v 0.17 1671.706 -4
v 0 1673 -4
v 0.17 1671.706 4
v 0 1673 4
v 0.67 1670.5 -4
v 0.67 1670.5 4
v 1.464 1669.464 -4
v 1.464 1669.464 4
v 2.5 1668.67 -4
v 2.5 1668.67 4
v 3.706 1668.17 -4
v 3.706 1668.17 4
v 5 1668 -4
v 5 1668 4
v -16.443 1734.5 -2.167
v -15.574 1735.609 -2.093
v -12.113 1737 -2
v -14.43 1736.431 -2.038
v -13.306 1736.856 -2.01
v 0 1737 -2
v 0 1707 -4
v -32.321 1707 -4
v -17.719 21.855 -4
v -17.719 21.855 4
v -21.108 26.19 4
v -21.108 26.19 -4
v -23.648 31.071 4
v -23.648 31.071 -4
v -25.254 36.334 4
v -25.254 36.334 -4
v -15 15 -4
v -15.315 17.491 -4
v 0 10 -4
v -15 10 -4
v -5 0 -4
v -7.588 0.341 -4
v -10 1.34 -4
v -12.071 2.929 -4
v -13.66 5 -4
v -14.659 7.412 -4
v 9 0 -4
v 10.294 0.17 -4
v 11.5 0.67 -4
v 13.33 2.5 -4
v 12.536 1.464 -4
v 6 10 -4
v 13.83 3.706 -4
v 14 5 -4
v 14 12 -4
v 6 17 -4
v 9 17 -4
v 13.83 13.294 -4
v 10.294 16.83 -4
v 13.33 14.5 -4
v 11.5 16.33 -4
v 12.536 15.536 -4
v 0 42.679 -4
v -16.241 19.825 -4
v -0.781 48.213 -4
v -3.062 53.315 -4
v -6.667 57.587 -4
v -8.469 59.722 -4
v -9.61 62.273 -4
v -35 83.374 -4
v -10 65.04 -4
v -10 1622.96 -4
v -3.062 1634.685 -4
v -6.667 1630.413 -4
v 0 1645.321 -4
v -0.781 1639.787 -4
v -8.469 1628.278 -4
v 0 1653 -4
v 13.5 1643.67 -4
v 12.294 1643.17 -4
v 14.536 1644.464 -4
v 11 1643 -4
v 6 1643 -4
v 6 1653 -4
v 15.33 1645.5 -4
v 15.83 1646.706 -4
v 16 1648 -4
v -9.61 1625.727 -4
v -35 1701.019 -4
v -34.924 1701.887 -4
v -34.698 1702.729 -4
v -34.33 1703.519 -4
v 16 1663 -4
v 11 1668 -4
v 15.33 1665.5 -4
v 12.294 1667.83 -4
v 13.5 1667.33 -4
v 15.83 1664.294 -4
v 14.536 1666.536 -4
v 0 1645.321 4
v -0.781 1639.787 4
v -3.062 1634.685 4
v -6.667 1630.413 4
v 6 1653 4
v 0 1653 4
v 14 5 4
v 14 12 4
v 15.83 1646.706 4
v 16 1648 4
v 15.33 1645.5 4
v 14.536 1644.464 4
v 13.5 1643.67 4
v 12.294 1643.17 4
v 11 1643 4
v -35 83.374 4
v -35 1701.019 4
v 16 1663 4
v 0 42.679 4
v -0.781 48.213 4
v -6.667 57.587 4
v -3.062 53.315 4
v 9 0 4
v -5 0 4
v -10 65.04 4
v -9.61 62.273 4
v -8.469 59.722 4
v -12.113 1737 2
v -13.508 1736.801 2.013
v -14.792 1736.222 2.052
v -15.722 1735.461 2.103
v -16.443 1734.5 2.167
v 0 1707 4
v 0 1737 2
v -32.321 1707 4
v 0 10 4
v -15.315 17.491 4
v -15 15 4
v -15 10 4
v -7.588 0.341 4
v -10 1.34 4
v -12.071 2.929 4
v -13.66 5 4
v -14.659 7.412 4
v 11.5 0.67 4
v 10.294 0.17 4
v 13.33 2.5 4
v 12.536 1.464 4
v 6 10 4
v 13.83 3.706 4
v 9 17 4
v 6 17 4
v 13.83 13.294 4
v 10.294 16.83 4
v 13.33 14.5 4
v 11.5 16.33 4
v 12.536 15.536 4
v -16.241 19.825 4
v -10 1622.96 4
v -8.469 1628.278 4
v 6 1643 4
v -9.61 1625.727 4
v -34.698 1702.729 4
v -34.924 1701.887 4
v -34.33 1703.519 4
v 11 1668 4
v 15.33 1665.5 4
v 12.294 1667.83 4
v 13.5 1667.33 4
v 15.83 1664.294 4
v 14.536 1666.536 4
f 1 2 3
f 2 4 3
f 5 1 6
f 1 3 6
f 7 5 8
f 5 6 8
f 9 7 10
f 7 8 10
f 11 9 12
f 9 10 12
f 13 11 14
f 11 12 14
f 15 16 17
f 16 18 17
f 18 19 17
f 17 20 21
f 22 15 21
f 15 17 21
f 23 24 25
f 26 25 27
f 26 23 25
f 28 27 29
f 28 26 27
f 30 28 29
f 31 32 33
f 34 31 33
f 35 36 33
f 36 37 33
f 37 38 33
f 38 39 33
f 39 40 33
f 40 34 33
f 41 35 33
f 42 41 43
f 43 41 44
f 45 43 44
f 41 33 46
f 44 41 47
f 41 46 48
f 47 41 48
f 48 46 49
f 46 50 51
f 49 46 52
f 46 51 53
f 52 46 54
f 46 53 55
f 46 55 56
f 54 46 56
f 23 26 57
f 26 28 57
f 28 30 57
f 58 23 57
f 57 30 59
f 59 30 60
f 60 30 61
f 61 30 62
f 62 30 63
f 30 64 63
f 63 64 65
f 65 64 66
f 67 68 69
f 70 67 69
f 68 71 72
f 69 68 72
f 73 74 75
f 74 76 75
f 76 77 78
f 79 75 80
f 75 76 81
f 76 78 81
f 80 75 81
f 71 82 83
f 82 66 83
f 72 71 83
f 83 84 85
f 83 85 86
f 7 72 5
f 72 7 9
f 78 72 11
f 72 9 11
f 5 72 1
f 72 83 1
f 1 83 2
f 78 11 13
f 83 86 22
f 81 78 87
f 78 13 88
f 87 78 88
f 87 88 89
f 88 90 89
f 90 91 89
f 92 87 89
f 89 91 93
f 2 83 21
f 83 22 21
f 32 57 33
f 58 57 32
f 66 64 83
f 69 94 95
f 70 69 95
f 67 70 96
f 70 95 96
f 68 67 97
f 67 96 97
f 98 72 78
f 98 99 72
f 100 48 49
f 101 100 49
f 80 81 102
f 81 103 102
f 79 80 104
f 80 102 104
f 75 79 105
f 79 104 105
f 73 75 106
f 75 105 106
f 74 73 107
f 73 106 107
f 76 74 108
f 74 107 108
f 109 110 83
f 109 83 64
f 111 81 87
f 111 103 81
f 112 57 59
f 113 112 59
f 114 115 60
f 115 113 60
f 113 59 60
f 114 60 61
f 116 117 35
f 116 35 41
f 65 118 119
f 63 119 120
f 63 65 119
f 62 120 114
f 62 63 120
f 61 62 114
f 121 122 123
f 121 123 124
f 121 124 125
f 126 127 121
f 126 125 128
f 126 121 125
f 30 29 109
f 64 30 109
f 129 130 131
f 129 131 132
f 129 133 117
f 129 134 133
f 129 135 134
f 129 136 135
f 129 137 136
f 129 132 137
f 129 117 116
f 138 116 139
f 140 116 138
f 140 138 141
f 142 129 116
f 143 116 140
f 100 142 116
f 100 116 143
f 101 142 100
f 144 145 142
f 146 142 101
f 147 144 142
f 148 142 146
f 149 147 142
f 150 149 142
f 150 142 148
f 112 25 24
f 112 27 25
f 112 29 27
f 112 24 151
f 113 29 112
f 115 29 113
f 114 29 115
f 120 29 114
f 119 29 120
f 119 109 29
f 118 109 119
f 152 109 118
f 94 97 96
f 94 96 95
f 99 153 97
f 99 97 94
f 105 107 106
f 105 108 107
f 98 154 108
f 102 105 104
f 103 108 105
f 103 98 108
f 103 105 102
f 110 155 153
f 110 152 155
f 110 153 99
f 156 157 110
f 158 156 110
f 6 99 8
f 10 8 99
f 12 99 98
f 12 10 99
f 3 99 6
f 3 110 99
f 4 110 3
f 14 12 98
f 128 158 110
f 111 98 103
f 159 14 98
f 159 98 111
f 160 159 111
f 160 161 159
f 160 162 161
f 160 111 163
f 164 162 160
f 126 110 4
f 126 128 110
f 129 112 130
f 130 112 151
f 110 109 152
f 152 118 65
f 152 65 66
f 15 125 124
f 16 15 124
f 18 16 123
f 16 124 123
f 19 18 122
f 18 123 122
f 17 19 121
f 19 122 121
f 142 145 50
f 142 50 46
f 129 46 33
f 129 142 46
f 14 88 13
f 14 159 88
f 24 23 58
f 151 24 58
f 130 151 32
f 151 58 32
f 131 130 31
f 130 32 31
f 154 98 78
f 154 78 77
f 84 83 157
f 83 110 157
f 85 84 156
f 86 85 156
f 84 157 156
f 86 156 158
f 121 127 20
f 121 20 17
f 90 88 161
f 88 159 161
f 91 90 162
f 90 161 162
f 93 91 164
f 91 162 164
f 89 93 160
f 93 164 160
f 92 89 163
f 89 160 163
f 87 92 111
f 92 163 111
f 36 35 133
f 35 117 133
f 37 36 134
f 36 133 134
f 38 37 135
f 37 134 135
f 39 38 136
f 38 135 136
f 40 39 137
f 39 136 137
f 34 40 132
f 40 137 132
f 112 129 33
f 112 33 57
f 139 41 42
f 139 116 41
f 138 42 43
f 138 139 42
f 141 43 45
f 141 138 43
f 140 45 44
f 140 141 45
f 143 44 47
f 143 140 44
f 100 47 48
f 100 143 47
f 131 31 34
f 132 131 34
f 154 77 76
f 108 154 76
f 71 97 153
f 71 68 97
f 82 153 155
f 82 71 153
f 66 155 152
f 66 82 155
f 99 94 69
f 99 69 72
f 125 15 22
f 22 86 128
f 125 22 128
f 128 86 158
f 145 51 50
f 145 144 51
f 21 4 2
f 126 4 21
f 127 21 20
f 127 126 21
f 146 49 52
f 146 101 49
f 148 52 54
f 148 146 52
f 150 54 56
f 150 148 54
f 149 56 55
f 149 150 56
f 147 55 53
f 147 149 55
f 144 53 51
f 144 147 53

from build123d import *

# Parameters (mm, degrees)
EXTRUDE_1_DEPTH          = 4
CHAMFER_1_SIZE           = 20
CHAMFER_1_SIZE2          = 34.641016151
FILLET_1_R               = 5
SKETCH_2_W               = 20
SKETCH_2_H               = 1568
CUT_EXTRUDE_1_DEPTH      = 1738.371002406
FILLET_2_R               = 20
FILLET_3_R               = 10
CUT_EXTRUDE_2_DEPTH      = 1738.371002406
CUT_EXTRUDE_2_DEPTH_BACK = 1738.371002406
FILLET_4_R               = 10
CHAMFER_START            = -30
CHAMFER_4_OUTLINE_W      = 63
CHAMFER_4_OUTLINE_H      = 8
CHAMFER_4_DEPTH          = 12.643216867
FILLET_6_R               = 30
CUT_EXTRUDE_3_DEPTH      = 1738.357188375


with BuildPart() as part:
    # Эскиз1 → Бобышка-Вытянуть1 (new, symmetric)
    with BuildSketch(Plane.XY):
        Polygon((0, 1653), (6, 1653), (6, 1643), (16, 1643), (16, 1668), (0, 1668), (0, 1737), (-35, 1737), (-35, 0), (14, 0), (14, 17), (6, 17), (6, 10), (0, 10), align=None)
    extrude(amount=EXTRUDE_1_DEPTH, both=True)

    # Фаска1
    chamfer_1_edges = [part.edges().sort_by_distance(p)[0] for p in [
        (-35, 1737, 0),
    ]]
    chamfer_1_side = [part.faces().sort_by_distance(p)[0] for p in [
        (-17.5, 1737, 0),
    ]]
    chamfer(chamfer_1_edges, length=CHAMFER_1_SIZE, length2=CHAMFER_1_SIZE2, reference=chamfer_1_side[0])

    # Скругление1
    fillet_1_edges = [part.edges().sort_by_distance(p)[0] for p in [
        (0, 1668, 0),
        (16, 1668, 0),
        (16, 1643, 0),
        (14, 17, 0),
        (14, 0, 0),
        (-35, 1702.358983849, 0),
        (-15, 1737, 0),
    ]]
    fillet(fillet_1_edges, radius=FILLET_1_R)

    # Эскиз2 → Вырез-Вытянуть1 (cut, through all)
    with BuildSketch(Plane.XY.offset(4)):
        with Locations((0, 844)):
            Rectangle(SKETCH_2_W, SKETCH_2_H)
    extrude(amount=-CUT_EXTRUDE_1_DEPTH, mode=Mode.SUBTRACT)

    # Скругление2
    # the kernel refuses this fillet: 20 mm, written as the material it takes off along each edge
    with BuildSketch(Plane(origin=(0, 1628, 47.301270189), x_dir=(0, 1, 0), z_dir=(0, 0, -1))) as fillet_2_piece_1:
        with BuildLine():
            CenterArc((17.320508076, -20), FILLET_2_R, 90, 60)
            Line((0, -10), (-0.346410162, -9.8))
            ThreePointArc((-0.346410162, -9.8), (-0.4, -5), (-0.4, 0))
            Line((-0.4, 0), (0, 0.4))
            Line((0, 0.4), (17.320508076, 0.4))
            Line((17.320508076, 0.4), (17.320508076, 0))
        make_face()
    extrude(amount=94.602540378, mode=Mode.SUBTRACT)
    with BuildSketch(Plane(origin=(0, 60, -47.301270189), x_dir=(-1, 0, 0), z_dir=(0, 0, 1))) as fillet_2_piece_2:
        with BuildLine():
            CenterArc((20, 17.320508076), FILLET_2_R, 180, 60)
            Line((0, 17.320508076), (-0.4, 17.320508076))
            Line((-0.4, 17.320508076), (-0.4, 0))
            Line((-0.4, 0), (0, -0.4))
            ThreePointArc((0, -0.4), (5, -0.4), (9.8, -0.346410162))
            Line((9.8, -0.346410162), (10, 0))
        make_face()
    extrude(amount=94.602540378, mode=Mode.SUBTRACT)

    # Скругление3
    fillet_3_edges = [part.edges().sort_by_distance(p)[0] for p in [
        (-10, 1628, 0),
        (-10, 60, 0),
    ]]
    fillet(fillet_3_edges, radius=FILLET_3_R)

    # Эскиз3 → Вырез-Вытянуть2 (cut, two sides: drawn at the far end of the back side and taken through both)
    with BuildSketch(Plane.XY.offset(4).offset(-CUT_EXTRUDE_2_DEPTH_BACK)):
        with BuildLine():
            Line((-15, 15), (-15, 0))
            Line((-15, 0), (-47.109663931, 0))
            Line((-47.109663931, 0), (-47.109663931, 63.037421146))
            Line((-47.109663931, 63.037421146), (-35, 63.037421146))
            Line((-35, 63.037421146), (-35, 25))
            Line((-35, 25), (-25, 25))
            ThreePointArc((-25, 25), (-17.928932188, 22.071067812), (-15, 15))
        make_face()
    extrude(amount=CUT_EXTRUDE_2_DEPTH + CUT_EXTRUDE_2_DEPTH_BACK, mode=Mode.SUBTRACT)

    # Скругление4
    fillet_4_edges = [part.edges().sort_by_distance(p)[0] for p in [
        (-15, 0, 0),
    ]]
    fillet(fillet_4_edges, radius=FILLET_4_R)

    # Фаска4: read off the stored shape, not the designer's step
    # Фаска4 outline → Фаска4 (cut)
    with BuildSketch(Plane(origin=(0, 0, 0), x_dir=(-0.2028847643439639, 0.9792026207057936, 0), z_dir=(0.9792026207057936, 0.2028847643439639, 0)).offset(CHAMFER_START)):
        with Locations((58.5, 0)):
            Rectangle(CHAMFER_4_OUTLINE_W, CHAMFER_4_OUTLINE_H)
    extrude(amount=CHAMFER_4_DEPTH, mode=Mode.SUBTRACT)

    # Скругление6
    fillet_6_edges = [part.edges().sort_by_distance(p)[0] for p in [
        (-22.857142857, 24.767710237, 0),
    ]]
    fillet(fillet_6_edges, radius=FILLET_6_R)

    # Эскиз4 → Вырез-Вытянуть3 (cut, through all)
    with BuildSketch(Plane(origin=(0, 0, 0), x_dir=(0, 0, -1), z_dir=(1, 0, 0))):
        Polygon((-4, 1707), (-4, 1737), (-2, 1737), align=None)
    cut_extrude_3 = extrude(amount=-CUT_EXTRUDE_3_DEPTH, mode=Mode.SUBTRACT)

    # Зеркальное отражение1: Вырез-Вытянуть3 across plane
    add(cut_extrude_3.mirror(Plane.XY), mode=Mode.SUBTRACT)


solid = part.part
